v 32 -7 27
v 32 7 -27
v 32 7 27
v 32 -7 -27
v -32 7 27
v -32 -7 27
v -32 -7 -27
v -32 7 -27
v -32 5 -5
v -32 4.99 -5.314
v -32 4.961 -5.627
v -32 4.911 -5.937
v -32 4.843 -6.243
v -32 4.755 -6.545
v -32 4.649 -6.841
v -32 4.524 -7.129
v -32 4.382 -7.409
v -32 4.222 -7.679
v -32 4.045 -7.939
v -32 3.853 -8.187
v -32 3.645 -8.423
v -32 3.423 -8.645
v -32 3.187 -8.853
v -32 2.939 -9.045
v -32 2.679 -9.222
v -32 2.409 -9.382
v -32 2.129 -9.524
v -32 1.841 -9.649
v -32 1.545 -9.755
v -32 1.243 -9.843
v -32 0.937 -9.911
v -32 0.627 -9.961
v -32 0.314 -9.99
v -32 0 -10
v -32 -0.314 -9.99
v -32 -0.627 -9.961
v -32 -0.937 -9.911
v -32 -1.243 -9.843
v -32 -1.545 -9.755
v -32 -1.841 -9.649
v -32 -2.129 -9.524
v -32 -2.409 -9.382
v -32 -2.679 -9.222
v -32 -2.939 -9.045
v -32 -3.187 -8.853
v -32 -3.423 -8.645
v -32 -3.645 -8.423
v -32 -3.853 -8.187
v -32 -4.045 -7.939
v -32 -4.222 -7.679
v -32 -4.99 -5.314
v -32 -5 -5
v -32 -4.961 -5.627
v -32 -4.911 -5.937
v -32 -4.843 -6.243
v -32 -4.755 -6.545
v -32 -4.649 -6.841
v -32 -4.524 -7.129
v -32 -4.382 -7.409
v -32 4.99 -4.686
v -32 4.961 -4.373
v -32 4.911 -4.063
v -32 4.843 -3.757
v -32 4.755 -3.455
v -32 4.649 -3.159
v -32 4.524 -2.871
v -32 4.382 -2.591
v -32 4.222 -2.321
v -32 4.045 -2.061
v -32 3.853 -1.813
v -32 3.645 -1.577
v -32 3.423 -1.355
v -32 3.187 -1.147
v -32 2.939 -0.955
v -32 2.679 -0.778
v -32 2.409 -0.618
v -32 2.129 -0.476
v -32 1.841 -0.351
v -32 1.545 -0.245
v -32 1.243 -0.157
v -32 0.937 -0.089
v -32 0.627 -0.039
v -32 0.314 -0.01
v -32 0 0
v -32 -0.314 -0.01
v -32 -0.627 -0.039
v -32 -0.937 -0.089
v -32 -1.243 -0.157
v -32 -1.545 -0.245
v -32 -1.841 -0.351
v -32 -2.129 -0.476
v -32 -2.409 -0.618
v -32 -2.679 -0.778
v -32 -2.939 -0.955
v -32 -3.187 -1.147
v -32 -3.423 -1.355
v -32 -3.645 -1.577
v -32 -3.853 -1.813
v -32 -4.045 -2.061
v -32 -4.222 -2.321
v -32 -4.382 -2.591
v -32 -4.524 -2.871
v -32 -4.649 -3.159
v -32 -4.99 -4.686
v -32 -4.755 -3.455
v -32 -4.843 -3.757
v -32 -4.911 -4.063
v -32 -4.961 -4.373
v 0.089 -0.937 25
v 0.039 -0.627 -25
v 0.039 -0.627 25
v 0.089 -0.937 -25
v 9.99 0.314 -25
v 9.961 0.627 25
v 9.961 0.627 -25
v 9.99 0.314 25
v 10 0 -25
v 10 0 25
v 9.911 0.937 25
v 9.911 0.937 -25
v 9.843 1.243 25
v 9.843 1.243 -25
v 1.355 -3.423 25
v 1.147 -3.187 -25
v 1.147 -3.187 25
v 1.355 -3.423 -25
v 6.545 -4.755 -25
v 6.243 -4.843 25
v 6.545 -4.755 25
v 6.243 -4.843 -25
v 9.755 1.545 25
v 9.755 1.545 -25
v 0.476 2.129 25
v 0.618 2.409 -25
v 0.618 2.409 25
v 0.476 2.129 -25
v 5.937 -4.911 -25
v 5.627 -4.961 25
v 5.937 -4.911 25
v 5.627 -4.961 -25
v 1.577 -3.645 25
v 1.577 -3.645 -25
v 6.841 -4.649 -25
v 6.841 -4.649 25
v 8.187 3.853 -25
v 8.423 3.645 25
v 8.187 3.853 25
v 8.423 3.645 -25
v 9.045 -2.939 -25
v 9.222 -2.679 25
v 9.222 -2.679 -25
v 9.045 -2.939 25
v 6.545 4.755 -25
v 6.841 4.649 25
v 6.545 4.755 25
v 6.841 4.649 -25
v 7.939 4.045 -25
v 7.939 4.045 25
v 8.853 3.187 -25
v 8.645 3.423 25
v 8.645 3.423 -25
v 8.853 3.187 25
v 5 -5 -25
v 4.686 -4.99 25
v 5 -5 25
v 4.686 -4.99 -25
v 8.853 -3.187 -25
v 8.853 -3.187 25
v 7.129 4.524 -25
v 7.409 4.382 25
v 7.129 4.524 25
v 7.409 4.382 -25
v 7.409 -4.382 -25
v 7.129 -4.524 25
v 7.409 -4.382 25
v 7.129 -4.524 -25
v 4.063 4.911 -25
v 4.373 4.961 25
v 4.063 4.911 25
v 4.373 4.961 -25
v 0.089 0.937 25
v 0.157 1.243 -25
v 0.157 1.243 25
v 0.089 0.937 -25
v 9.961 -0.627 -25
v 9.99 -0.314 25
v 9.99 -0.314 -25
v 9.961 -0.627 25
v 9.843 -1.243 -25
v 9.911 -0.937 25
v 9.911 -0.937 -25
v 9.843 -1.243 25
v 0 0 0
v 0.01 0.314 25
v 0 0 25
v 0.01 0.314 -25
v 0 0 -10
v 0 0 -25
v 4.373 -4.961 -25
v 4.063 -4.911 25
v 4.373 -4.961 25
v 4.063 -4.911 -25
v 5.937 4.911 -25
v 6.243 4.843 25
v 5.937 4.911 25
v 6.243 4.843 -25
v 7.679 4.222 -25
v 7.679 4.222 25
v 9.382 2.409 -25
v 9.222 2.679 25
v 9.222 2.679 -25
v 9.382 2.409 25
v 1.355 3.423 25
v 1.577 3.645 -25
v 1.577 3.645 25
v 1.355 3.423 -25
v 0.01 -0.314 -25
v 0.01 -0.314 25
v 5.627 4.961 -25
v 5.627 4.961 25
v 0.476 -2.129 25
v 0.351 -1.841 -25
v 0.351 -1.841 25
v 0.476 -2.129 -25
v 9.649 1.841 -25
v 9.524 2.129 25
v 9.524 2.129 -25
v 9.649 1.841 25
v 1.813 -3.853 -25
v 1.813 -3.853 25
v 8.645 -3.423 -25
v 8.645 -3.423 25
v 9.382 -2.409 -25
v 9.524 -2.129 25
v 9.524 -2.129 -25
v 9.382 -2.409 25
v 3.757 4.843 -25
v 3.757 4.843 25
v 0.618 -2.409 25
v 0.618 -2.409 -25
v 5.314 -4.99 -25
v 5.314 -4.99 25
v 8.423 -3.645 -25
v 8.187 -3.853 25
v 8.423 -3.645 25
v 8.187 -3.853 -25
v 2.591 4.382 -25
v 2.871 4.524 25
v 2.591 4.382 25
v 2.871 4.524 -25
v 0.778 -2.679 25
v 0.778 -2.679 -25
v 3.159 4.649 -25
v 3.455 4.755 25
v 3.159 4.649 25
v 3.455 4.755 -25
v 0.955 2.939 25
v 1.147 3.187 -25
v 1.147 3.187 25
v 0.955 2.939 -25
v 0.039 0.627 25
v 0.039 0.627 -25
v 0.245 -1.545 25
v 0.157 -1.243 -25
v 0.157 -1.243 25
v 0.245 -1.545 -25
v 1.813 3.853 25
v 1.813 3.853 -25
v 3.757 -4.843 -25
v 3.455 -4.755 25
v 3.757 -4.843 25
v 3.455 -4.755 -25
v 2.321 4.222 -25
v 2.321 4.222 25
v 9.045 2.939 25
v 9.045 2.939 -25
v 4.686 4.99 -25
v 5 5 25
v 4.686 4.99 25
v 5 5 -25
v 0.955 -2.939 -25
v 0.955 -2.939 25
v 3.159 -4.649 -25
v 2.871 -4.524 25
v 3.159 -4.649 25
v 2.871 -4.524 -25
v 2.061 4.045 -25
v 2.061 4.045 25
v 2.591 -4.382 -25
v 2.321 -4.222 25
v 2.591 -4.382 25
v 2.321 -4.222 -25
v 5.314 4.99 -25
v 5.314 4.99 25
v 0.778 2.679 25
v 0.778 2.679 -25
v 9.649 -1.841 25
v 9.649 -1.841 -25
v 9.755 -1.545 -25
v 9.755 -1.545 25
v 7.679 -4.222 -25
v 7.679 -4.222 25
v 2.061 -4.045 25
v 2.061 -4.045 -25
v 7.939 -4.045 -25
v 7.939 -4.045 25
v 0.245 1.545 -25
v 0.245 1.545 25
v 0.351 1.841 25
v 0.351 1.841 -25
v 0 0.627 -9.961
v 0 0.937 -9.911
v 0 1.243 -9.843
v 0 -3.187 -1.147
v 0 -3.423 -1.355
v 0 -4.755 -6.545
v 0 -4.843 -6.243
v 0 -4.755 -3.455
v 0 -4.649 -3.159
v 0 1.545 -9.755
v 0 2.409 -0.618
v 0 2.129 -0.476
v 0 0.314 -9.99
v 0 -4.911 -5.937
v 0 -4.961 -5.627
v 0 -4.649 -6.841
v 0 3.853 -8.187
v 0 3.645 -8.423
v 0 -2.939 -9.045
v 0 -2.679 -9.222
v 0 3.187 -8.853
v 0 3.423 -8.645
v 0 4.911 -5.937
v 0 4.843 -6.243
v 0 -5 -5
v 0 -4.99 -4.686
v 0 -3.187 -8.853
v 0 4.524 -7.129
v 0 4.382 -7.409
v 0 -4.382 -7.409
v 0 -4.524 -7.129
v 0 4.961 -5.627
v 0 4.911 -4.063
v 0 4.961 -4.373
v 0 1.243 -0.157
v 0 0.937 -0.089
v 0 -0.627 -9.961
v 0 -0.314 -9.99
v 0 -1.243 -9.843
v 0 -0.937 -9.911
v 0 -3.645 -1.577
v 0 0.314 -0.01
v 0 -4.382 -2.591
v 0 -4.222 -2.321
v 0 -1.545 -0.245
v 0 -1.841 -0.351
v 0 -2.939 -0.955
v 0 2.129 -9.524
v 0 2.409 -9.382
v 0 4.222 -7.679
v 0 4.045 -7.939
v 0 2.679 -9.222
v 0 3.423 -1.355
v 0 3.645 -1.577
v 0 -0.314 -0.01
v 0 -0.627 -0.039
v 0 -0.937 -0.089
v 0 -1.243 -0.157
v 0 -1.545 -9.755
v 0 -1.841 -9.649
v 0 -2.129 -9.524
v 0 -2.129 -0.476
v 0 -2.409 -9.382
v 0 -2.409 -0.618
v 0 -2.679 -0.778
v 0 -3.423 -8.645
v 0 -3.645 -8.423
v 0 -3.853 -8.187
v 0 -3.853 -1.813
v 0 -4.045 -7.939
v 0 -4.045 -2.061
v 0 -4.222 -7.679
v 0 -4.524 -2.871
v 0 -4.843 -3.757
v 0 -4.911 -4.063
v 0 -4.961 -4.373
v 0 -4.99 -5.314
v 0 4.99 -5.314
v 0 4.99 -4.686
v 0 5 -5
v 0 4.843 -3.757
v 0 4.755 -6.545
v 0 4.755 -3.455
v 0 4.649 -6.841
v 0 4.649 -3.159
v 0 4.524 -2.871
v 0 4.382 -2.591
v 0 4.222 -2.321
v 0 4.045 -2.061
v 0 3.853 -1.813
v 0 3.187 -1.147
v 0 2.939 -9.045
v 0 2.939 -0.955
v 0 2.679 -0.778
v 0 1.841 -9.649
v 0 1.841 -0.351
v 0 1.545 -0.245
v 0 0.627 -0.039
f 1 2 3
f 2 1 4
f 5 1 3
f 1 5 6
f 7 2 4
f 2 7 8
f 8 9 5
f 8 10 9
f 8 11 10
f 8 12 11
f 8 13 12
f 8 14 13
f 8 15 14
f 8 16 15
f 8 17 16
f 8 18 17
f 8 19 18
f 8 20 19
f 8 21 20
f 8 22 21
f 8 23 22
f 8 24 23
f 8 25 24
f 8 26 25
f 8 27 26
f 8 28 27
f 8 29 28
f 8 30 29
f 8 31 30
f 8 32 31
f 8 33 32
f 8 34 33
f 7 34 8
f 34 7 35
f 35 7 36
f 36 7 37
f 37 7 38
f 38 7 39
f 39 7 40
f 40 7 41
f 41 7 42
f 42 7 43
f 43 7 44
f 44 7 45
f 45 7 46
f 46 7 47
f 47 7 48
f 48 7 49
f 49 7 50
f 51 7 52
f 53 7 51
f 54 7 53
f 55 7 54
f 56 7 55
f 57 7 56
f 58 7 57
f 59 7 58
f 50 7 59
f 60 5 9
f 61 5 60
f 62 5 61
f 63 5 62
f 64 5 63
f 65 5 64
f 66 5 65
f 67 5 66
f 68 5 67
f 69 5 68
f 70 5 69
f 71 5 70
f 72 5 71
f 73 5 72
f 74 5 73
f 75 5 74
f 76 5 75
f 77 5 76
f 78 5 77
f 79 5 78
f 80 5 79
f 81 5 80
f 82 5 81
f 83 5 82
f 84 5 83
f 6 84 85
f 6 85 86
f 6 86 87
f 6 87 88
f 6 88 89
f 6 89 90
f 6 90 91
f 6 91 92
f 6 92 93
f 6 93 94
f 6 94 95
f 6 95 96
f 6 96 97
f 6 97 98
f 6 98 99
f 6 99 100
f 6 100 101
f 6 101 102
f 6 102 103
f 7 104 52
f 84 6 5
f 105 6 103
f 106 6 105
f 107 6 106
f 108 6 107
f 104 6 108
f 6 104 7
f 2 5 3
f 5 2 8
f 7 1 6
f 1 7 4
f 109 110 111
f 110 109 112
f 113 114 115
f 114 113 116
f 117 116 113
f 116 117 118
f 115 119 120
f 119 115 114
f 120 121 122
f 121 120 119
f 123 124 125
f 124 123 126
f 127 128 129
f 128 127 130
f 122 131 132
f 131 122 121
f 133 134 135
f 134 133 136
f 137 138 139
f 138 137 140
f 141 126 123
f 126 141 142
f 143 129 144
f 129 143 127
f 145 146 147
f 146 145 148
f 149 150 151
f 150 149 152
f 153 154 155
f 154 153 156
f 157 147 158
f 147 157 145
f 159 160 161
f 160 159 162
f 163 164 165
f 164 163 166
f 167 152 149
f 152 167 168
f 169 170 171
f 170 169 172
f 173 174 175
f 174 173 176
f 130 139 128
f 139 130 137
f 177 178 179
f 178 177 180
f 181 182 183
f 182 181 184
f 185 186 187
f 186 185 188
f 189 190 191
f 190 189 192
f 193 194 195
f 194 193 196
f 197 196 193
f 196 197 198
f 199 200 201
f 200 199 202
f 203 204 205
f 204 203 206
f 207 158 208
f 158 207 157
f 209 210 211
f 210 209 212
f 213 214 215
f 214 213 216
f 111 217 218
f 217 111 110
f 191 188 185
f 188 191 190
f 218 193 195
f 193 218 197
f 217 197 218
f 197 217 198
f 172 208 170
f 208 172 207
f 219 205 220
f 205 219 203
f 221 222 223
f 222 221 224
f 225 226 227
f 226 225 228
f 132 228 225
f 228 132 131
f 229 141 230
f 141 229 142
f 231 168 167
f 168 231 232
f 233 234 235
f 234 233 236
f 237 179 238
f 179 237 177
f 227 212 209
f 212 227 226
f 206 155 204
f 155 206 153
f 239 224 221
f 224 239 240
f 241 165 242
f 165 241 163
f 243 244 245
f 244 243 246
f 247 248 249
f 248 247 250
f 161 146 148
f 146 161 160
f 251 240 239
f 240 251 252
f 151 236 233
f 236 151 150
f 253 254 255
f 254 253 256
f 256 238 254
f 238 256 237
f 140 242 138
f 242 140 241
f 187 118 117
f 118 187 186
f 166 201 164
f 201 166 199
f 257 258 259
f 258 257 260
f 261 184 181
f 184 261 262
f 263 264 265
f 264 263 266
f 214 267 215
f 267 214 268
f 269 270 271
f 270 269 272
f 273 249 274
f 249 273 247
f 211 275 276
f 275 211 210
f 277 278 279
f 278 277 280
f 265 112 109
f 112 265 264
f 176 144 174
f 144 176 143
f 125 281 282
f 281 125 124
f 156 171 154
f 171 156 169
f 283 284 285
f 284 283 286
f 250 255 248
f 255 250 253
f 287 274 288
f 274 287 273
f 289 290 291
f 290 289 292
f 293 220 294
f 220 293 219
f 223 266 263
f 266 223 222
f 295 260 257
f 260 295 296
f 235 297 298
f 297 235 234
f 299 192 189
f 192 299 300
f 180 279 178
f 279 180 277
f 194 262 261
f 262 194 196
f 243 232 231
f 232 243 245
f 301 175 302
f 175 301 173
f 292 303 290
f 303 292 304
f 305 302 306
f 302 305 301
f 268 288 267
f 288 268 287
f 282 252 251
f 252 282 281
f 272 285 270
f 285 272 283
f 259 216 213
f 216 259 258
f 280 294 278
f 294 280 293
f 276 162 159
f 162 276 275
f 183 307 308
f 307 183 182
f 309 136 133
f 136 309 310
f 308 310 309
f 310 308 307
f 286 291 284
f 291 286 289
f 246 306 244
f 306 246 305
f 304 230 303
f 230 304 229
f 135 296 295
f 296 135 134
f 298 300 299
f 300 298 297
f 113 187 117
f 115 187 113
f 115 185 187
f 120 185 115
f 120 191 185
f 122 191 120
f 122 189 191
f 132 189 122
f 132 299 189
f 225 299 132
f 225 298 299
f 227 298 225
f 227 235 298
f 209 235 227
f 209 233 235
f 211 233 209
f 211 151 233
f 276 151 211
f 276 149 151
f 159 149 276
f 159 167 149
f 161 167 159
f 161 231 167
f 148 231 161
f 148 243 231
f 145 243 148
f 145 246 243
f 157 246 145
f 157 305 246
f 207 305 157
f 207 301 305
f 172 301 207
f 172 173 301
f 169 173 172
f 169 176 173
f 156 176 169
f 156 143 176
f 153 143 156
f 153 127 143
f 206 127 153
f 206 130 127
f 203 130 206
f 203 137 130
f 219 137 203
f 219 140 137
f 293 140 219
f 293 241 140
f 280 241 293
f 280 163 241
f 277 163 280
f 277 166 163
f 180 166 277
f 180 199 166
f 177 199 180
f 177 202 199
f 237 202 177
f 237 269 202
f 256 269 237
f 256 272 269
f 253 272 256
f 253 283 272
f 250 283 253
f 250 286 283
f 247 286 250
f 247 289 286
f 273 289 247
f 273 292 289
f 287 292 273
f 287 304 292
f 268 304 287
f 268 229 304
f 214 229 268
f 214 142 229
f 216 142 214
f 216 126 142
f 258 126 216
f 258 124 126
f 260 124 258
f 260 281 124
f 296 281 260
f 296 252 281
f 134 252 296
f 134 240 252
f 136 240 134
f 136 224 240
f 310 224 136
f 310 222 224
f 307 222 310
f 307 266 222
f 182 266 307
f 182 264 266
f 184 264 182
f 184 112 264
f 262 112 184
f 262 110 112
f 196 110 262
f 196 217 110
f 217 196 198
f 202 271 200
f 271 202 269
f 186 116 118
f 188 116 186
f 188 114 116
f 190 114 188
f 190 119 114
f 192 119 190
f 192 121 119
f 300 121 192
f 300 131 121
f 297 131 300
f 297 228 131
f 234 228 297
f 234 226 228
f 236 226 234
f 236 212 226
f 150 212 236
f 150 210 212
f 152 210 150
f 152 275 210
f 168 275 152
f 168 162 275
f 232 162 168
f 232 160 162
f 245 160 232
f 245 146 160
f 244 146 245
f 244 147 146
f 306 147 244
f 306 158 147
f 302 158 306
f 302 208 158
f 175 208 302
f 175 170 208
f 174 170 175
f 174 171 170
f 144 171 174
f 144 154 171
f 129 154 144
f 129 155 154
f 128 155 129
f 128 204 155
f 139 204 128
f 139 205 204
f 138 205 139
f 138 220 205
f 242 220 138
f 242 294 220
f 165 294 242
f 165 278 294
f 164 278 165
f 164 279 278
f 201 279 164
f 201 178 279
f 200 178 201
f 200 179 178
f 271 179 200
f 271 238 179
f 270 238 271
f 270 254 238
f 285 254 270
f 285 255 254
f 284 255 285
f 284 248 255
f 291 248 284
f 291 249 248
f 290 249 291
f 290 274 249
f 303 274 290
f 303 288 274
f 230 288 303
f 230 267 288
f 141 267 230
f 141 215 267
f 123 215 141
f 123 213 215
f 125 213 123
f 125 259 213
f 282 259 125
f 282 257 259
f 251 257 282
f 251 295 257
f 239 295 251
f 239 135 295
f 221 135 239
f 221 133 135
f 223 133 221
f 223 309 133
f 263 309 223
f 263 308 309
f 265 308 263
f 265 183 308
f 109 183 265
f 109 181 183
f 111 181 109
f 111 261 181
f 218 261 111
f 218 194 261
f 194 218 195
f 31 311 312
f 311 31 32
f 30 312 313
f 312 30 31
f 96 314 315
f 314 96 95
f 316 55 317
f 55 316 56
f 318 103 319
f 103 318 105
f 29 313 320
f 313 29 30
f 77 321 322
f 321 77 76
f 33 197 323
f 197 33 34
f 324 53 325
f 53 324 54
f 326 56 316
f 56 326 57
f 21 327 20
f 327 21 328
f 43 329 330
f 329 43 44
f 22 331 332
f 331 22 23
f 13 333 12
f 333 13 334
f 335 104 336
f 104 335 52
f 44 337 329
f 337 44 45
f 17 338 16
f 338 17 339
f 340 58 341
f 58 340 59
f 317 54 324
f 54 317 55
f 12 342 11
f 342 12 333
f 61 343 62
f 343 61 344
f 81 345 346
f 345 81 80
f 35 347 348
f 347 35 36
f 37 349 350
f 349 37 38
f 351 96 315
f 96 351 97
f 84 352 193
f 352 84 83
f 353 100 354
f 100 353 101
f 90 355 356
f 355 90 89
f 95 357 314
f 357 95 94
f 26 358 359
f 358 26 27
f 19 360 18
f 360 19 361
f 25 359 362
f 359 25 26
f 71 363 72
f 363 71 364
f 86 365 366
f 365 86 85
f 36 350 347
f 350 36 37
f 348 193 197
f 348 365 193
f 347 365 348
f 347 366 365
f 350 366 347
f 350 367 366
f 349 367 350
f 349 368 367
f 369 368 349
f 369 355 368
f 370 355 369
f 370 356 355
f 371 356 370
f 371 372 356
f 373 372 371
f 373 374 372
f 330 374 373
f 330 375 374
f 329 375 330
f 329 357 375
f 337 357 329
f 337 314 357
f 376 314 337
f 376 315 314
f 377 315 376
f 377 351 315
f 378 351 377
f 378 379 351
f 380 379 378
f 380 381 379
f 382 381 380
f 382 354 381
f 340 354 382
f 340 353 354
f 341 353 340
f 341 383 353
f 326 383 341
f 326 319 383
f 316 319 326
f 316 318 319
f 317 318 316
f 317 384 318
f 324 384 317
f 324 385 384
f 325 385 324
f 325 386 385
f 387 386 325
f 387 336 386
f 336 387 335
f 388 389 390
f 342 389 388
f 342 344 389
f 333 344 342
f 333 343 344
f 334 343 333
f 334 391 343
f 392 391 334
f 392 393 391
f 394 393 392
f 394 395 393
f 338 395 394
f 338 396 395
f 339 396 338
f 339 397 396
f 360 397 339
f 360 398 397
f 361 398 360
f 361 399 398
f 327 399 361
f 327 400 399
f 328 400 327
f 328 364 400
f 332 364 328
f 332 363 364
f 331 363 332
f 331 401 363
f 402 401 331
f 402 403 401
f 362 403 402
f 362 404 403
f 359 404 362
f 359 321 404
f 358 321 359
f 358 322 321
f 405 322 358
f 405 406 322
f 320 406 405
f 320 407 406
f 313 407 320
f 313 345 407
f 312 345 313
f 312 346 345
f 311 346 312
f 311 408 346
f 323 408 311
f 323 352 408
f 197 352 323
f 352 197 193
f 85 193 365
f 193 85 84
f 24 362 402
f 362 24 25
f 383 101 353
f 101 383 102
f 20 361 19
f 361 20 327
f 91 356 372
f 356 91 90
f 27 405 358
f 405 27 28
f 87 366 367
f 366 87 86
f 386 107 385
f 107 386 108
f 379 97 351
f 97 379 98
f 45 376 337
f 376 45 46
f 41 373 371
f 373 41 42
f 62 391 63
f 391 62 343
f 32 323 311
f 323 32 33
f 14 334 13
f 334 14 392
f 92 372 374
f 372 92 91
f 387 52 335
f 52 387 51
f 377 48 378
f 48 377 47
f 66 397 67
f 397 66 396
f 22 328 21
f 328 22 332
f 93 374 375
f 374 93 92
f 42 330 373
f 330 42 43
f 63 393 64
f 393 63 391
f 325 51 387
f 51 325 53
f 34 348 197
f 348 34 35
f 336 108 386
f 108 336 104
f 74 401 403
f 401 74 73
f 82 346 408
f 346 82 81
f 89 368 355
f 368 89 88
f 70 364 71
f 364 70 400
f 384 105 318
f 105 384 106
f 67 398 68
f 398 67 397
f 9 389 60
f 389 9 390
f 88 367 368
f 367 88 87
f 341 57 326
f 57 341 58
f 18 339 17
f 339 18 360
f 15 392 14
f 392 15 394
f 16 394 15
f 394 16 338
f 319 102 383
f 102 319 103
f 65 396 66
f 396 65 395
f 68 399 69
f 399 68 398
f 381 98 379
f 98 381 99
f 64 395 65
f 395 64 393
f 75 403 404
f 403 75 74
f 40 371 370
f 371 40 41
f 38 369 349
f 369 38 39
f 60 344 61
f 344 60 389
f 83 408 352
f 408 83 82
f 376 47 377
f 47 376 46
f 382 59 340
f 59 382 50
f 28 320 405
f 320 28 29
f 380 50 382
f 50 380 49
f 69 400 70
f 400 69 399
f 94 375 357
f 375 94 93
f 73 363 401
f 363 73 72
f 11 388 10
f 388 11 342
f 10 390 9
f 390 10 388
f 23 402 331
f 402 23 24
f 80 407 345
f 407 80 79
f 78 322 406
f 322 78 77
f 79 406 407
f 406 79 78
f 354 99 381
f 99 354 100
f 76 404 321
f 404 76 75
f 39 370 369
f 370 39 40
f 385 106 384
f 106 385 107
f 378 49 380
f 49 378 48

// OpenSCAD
/* 
	Supplemental T-Junction 6

*/

$fn = 100;  // Increase the resolution of the cylinders
pipe_radius = 5;
pipe_length = 50;

// Define the cube dimensions
cube_size = [pipe_length + 4 + 2*pipe_radius, 2*pipe_radius + 4, pipe_length + 4];

difference() {
    // Create the cube
    translate([0, 0, 0])
    cube(cube_size, center=true);

    // Subtract the x-axis pipe, shifted to the center of the new cube size
    translate([pipe_radius, 0, 0])
    cylinder(h=pipe_length, r=pipe_radius, center=true);

    // Subtract the y-axis pipe, shifted accordingly
    rotate([0, 90, 0])
    translate([pipe_radius, 0, -pipe_length/2])
    cylinder(h=pipe_length, r=pipe_radius, center=true);
}
